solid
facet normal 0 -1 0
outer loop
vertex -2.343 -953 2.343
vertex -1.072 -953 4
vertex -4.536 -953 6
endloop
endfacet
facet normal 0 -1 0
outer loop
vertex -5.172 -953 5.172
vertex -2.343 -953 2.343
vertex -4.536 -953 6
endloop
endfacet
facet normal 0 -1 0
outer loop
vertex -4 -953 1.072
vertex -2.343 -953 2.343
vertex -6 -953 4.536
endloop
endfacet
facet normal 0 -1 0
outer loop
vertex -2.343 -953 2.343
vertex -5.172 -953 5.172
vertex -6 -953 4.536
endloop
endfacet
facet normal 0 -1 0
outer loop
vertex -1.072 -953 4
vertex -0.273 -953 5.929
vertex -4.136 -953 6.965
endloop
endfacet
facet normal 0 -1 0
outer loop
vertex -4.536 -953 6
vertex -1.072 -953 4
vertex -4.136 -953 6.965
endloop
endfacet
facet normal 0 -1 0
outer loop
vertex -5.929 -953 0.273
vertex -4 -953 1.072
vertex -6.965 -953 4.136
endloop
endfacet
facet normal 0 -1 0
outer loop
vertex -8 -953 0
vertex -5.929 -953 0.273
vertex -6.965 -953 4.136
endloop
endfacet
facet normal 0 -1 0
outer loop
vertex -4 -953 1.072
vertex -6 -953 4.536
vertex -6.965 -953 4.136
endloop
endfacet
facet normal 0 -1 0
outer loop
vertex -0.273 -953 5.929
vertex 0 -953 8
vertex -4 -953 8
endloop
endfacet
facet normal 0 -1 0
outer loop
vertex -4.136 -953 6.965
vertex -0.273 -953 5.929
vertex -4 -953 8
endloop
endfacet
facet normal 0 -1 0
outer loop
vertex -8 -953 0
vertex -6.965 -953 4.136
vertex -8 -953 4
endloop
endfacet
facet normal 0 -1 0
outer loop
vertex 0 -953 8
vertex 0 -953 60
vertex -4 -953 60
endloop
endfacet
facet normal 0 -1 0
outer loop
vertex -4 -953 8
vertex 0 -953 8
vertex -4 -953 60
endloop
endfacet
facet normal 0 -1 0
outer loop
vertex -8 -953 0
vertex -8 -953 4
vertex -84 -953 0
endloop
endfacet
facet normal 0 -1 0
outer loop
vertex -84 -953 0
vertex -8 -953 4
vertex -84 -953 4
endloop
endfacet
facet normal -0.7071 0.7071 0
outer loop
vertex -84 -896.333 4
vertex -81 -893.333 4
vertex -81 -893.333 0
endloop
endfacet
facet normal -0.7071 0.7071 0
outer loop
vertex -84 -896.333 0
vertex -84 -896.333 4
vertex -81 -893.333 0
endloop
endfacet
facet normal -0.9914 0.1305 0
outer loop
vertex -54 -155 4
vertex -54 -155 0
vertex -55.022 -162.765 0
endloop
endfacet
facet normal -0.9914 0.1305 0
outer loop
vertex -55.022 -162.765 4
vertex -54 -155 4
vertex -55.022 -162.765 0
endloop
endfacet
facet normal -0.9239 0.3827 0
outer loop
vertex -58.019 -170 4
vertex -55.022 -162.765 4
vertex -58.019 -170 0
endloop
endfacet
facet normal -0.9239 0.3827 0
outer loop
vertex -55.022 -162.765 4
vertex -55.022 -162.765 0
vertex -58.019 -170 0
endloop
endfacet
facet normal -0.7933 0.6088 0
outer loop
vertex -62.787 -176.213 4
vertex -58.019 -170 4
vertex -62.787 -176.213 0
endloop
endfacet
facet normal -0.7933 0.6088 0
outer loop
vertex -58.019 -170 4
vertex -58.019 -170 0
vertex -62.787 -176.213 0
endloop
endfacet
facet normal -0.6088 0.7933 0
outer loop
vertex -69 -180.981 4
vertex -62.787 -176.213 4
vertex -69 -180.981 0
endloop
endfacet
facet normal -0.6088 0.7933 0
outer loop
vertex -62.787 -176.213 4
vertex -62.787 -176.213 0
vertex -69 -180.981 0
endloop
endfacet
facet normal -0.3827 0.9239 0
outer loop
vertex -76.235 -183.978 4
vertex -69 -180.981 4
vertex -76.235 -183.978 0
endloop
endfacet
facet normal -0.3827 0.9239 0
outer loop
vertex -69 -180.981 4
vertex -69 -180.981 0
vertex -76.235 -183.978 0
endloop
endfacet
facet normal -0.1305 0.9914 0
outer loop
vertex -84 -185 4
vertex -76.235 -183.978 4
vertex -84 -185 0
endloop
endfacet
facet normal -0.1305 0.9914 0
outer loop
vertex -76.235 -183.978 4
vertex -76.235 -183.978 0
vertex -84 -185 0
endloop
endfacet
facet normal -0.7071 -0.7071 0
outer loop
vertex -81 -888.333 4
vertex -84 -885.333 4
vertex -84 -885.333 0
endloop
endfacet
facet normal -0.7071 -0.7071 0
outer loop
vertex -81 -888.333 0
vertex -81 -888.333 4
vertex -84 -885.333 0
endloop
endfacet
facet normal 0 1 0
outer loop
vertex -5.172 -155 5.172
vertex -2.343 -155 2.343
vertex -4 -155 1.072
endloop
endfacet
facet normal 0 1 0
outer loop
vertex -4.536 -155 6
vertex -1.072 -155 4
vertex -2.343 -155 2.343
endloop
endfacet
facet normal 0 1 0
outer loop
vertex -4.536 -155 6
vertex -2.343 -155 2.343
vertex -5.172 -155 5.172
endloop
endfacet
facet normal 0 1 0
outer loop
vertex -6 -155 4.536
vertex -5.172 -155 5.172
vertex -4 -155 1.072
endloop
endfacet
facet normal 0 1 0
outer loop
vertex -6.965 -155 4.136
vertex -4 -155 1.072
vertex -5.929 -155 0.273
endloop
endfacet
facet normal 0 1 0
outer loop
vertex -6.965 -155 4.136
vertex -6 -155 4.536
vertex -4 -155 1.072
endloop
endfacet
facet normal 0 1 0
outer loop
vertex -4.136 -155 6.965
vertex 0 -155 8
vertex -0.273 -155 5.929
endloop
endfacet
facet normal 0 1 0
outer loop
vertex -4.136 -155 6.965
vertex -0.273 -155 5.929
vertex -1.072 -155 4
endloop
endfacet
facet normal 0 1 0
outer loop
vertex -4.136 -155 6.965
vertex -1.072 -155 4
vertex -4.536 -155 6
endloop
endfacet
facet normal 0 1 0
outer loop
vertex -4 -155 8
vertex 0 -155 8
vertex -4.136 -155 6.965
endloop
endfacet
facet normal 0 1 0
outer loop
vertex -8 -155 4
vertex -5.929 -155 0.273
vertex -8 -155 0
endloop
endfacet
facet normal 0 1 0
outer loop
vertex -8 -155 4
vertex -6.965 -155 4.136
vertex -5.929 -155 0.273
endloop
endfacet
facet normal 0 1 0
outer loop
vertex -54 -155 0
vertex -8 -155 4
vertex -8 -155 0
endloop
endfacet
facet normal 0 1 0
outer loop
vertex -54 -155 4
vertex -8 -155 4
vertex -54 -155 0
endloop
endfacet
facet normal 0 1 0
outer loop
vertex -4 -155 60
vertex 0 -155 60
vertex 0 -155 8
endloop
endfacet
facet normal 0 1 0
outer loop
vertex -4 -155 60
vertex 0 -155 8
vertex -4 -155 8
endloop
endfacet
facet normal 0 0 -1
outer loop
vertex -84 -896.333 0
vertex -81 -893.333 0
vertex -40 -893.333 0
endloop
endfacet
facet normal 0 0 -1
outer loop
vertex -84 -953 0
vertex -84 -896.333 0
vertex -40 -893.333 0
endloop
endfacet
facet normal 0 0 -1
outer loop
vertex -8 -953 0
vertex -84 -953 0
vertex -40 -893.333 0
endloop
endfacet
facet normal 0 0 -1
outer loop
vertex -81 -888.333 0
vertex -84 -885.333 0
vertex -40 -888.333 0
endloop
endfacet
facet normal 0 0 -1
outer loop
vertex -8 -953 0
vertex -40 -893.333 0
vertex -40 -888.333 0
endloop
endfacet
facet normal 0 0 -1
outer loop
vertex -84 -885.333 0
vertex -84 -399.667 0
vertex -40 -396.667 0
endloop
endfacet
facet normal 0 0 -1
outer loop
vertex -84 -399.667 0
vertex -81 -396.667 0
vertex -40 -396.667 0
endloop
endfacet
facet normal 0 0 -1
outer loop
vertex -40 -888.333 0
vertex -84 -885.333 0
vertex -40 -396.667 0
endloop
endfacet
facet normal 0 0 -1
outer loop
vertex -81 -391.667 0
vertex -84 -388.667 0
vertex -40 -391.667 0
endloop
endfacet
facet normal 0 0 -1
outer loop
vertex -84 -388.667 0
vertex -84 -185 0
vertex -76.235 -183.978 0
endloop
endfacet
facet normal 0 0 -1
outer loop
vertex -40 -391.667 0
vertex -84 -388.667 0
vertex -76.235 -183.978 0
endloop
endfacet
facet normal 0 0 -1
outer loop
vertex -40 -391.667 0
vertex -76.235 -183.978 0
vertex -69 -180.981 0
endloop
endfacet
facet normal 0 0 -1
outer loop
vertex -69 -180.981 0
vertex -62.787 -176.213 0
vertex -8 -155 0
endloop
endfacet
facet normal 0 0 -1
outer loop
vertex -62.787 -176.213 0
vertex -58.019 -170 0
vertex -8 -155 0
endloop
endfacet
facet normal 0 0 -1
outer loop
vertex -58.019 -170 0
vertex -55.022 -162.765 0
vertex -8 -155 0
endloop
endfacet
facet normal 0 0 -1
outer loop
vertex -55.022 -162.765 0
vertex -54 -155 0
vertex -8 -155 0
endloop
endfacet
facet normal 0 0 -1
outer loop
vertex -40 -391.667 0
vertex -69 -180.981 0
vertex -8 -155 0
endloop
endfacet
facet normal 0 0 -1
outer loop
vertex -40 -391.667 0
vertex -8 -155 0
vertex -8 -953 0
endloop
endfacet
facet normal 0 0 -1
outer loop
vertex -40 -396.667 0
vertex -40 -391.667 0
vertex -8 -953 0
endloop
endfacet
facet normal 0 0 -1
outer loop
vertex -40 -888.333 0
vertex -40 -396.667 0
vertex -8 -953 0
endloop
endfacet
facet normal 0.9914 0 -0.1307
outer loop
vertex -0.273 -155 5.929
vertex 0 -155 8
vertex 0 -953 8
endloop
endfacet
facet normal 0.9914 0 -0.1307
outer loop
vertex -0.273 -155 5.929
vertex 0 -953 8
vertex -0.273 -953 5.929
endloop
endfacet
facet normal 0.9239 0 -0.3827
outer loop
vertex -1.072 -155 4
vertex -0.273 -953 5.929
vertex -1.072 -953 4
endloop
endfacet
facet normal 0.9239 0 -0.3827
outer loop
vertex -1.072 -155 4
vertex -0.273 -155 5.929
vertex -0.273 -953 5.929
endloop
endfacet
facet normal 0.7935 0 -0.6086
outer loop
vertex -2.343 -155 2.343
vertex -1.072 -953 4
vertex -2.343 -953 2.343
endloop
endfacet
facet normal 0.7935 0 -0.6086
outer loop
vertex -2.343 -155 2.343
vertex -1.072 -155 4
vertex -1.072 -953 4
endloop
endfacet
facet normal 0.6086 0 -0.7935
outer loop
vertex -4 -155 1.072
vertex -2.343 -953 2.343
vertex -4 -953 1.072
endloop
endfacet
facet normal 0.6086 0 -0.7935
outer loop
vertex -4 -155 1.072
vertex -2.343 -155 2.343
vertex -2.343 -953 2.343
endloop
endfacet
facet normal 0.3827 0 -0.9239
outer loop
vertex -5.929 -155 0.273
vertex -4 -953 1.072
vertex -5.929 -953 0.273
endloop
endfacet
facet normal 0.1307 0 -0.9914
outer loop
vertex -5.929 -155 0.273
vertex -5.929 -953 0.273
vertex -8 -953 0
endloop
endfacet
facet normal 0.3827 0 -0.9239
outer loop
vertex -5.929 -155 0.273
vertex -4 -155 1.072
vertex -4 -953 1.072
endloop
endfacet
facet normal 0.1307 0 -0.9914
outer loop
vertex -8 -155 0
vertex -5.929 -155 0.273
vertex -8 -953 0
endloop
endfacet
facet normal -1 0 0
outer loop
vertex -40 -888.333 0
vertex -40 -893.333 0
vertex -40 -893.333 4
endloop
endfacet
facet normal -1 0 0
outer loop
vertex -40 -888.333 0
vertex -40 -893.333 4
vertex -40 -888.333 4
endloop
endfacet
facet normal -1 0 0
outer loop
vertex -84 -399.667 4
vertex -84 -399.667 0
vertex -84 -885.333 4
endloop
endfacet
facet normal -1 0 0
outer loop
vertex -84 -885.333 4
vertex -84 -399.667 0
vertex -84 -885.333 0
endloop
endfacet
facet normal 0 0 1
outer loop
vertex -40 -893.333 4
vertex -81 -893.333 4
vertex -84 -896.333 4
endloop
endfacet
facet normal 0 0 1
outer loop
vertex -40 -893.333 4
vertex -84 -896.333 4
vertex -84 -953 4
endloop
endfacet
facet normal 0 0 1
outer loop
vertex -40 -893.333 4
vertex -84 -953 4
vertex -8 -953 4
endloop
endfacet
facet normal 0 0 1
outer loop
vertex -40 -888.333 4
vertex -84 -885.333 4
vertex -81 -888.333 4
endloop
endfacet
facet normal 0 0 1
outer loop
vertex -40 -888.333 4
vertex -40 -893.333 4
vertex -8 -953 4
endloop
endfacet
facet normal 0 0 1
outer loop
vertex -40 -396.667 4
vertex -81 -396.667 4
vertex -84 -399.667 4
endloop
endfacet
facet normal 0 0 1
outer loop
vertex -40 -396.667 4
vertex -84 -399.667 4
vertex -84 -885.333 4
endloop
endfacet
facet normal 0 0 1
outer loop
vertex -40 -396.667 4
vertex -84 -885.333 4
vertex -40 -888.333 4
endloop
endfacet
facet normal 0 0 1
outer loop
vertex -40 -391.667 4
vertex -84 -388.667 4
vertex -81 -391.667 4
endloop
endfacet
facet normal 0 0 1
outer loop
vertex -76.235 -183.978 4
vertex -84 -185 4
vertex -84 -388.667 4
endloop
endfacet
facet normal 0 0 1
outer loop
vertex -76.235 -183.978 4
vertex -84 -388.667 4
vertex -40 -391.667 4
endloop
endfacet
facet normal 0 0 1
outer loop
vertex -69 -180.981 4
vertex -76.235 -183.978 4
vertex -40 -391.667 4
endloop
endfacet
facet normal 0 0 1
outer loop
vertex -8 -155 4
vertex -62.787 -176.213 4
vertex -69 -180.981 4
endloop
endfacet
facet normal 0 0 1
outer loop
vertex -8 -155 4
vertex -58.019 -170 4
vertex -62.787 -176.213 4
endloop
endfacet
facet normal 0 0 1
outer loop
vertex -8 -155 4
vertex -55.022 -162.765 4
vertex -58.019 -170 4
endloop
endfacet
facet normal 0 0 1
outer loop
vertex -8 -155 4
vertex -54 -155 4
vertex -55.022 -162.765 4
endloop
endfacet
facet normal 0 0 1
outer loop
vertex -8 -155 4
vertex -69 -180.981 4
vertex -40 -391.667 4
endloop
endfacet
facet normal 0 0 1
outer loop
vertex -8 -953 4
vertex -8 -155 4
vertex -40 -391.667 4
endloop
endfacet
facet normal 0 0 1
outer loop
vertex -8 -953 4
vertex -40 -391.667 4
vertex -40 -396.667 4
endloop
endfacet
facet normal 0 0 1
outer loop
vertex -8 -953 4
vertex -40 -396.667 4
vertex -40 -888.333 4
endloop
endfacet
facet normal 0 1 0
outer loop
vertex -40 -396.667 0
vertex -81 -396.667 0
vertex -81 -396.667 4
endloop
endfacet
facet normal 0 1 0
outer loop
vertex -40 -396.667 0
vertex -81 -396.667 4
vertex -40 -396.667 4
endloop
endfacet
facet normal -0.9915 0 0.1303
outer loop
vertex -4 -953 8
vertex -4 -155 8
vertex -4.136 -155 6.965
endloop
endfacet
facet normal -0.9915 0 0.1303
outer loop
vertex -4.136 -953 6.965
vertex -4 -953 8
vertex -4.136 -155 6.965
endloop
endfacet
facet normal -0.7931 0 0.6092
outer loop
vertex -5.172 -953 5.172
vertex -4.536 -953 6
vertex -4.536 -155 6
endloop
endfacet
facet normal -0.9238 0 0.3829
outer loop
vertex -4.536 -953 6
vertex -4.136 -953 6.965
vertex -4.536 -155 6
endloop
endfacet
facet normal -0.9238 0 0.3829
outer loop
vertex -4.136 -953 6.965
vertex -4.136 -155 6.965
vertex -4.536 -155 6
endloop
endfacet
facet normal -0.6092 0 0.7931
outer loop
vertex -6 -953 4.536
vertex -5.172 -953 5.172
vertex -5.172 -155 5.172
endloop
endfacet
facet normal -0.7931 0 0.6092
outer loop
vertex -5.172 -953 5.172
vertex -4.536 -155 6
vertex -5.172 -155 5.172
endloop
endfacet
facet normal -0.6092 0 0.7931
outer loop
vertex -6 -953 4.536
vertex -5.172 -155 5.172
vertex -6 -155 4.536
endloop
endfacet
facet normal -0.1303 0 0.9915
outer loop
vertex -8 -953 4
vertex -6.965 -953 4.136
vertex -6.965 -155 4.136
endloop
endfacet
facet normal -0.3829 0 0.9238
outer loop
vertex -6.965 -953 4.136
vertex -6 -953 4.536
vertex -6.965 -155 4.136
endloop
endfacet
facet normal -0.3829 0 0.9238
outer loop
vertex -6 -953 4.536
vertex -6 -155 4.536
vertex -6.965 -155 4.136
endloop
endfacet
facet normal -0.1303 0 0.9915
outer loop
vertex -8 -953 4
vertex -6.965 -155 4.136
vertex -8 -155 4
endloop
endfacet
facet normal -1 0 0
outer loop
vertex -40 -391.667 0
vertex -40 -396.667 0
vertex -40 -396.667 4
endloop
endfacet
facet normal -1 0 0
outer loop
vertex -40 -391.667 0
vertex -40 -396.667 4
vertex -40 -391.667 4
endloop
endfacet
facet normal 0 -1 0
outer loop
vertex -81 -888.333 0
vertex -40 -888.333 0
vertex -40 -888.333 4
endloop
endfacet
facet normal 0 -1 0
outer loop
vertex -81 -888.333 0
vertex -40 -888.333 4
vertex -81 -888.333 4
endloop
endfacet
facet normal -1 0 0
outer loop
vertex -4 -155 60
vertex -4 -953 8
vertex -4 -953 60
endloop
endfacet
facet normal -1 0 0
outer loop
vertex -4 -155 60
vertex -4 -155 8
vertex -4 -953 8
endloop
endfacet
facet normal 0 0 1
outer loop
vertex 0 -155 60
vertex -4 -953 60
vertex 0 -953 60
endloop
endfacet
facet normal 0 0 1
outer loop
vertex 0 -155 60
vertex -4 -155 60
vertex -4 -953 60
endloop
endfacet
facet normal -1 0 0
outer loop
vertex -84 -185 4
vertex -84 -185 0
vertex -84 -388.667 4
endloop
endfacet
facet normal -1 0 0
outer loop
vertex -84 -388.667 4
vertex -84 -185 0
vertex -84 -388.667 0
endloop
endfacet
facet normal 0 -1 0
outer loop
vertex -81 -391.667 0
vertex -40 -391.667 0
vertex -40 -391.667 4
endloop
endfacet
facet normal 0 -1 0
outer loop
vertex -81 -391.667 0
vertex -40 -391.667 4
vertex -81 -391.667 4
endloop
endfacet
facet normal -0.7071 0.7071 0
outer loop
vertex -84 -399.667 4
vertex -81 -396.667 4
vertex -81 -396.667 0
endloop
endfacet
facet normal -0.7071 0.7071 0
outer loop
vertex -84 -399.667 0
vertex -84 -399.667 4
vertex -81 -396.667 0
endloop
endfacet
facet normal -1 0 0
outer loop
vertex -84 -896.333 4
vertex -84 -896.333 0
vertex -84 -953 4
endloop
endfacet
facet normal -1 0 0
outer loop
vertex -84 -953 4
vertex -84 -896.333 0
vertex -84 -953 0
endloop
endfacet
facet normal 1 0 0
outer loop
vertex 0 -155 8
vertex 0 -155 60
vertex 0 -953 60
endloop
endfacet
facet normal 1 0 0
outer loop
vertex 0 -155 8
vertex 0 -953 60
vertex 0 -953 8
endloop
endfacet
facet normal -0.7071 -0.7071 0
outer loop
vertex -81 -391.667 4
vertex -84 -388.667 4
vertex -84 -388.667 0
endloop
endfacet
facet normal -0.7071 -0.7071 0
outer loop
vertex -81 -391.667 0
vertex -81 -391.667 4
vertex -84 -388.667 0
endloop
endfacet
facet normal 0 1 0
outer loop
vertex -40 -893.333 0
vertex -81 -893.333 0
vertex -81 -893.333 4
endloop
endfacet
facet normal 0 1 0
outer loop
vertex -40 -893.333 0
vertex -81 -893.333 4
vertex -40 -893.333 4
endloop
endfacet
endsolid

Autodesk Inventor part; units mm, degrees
ref_plane "YZ Plane" through (0, 0, 0) normal (1, 0, 0) x (0, 1, 0)
ref_plane "XZ Plane" through (0, 0, 0) normal (0, 1, 0) x (-1, 0, 0)
ref_plane "XY Plane" through (0, 0, 0) normal (0, 0, 1) x (1, 0, 0)
sketch "Sketch1" plane through (0, 0, 0) normal (0, 0, 1) x (1, 0, 0)
  line L0 (0, 0) -> (-84, 0)
  line L1 (-84, 0) -> (-84, -1490)
  line L2 (-84, -1490) -> (0, -1490)
  line L3 (0, -1490) -> (0, 0)
  line L4 (-84, -1390) -> (-40, -1390)
  line L5 (-40, -1390) -> (-40, -1385)
  line L6 (-40, -1385) -> (-84, -1385)
  line L7 (-84, -1385) -> (-84, -1390)
  line L8 (-84, -893.3333) -> (-40, -893.3333)
  line L9 (-40, -893.3333) -> (-40, -888.3333)
  line L10 (-40, -888.3333) -> (-84, -888.3333)
  line L11 (-84, -888.3333) -> (-84, -893.3333)
  line L12 (-84, -396.6667) -> (-40, -396.6667)
  line L13 (-40, -396.6667) -> (-40, -391.6667)
  line L14 (-40, -391.6667) -> (-84, -391.6667)
  line L15 (-84, -391.6667) -> (-84, -396.6667)
  circle A0 centre (-84, -155) radius 30
  line L16 (-84, -953) -> (0, -953)
  line L17 (-84, -155) -> (0, -155)
  point P0 (-84, -391.6667)
  point P1 (-84, -396.6667)
  point P2 (-84, -888.3333)
  point P3 (-84, -893.3333)
  point P4 (-84, -1385)
  point P5 (-84, -125)
  point P6 (-84, -185)
  point P7 (-54, -155)
  dimension "d0" = 1490
  dimension "d1" = 84
  dimension "d2" = 5
  dimension "d4" = 100
  dimension "d7" = 496.6667
  dimension "d23" = 40
  dimension "d28" = 60
  dimension "d29" = 1335
  dimension "d30" = 953
extrude "Plate1" add sketch "Sketch1" along normal blind 4 contours L3 L16 L1 L8 L9 L10 L12 L13 L14 A0 L17
sketch "Sketch2" plane through (-4, -155, 0) normal (1, 0, 0) x (0, 1, 0)
  line L0 (-798, 0) -> (0, 0)
  line L1 (0, 0) -> (0, 60)
  line L2 (0, 60) -> (-798, 60)
  line L3 (-798, 60) -> (-798, 0)
edge flange "Flange1" height 60 angle 90 thickness 4 bend radius 4 thickness toward (1, 0, 0) relief tear relief width 4 relief depth 2 edges at (0, -554, 4) wall of the first edge with corners at (-4, -953, 0) (-4, -155, 0) (-4, -155, 60) (-4, -953, 60)
bend "Bend1"
corner "Corner1"
chamfer "Corner Chamfer1" distance 3 angle 45 4 edges at (-84, -893.3333, 2) (-84, -888.3333, 2) (-84, -391.6667, 2) (-84, -396.6667, 2)
equation "\"d0\" = Стрингер_длина"
equation "\"d2\" = паз_под_стрингер_толщина"
equation "\"d7\" = Шаг_шпангоутов"
equation "\"d28\" = 2 * радиус_выреза_под_сварку"
equation "\"d12\" = Thickness"
equation "\"d13\" = BendReliefWidth"
equation "\"d14\" = BendReliefDepth"
equation "\"d15\" = MinimumRemnant"
equation "\"d16\" = TransitionRadius"
equation "\"d17\" = ребро_усилителей"
equation "\"d19\" = BendRadius"
equation "\"d20\" = CornerReliefSize"
equation "\"d21\" = GapSize"
equation "\"d22\" = JacobiRadiusSize"
equation "\"BendRadius\" = Thickness"
equation "\"BendReliefWidth\" = Thickness"
equation "\"BendReliefDepth\" = 0.5 * Thickness"
equation "\"CornerReliefSize\" = 4 * Thickness"
equation "\"MinimumRemnant\" = 2 * Thickness"
equation "\"TransitionRadius\" = BendRadius"
equation "\"JacobiRadiusSize\" = BendRadius"
equation "\"GapSize\" = Thickness"
equation "\"Стрингер_длина\" = 1490"
equation "\"паз_под_стрингер_толщина\" = 5"
equation "\"Шаг_шпангоутов\" = 496.666667"
equation "\"радиус_выреза_под_сварку\" = 30"
equation "\"Thickness\" = 4"
equation "\"ребро_усилителей\" = 60"
properties part number "GBK 0104 stringer 3_Dummy" material "Steel"
